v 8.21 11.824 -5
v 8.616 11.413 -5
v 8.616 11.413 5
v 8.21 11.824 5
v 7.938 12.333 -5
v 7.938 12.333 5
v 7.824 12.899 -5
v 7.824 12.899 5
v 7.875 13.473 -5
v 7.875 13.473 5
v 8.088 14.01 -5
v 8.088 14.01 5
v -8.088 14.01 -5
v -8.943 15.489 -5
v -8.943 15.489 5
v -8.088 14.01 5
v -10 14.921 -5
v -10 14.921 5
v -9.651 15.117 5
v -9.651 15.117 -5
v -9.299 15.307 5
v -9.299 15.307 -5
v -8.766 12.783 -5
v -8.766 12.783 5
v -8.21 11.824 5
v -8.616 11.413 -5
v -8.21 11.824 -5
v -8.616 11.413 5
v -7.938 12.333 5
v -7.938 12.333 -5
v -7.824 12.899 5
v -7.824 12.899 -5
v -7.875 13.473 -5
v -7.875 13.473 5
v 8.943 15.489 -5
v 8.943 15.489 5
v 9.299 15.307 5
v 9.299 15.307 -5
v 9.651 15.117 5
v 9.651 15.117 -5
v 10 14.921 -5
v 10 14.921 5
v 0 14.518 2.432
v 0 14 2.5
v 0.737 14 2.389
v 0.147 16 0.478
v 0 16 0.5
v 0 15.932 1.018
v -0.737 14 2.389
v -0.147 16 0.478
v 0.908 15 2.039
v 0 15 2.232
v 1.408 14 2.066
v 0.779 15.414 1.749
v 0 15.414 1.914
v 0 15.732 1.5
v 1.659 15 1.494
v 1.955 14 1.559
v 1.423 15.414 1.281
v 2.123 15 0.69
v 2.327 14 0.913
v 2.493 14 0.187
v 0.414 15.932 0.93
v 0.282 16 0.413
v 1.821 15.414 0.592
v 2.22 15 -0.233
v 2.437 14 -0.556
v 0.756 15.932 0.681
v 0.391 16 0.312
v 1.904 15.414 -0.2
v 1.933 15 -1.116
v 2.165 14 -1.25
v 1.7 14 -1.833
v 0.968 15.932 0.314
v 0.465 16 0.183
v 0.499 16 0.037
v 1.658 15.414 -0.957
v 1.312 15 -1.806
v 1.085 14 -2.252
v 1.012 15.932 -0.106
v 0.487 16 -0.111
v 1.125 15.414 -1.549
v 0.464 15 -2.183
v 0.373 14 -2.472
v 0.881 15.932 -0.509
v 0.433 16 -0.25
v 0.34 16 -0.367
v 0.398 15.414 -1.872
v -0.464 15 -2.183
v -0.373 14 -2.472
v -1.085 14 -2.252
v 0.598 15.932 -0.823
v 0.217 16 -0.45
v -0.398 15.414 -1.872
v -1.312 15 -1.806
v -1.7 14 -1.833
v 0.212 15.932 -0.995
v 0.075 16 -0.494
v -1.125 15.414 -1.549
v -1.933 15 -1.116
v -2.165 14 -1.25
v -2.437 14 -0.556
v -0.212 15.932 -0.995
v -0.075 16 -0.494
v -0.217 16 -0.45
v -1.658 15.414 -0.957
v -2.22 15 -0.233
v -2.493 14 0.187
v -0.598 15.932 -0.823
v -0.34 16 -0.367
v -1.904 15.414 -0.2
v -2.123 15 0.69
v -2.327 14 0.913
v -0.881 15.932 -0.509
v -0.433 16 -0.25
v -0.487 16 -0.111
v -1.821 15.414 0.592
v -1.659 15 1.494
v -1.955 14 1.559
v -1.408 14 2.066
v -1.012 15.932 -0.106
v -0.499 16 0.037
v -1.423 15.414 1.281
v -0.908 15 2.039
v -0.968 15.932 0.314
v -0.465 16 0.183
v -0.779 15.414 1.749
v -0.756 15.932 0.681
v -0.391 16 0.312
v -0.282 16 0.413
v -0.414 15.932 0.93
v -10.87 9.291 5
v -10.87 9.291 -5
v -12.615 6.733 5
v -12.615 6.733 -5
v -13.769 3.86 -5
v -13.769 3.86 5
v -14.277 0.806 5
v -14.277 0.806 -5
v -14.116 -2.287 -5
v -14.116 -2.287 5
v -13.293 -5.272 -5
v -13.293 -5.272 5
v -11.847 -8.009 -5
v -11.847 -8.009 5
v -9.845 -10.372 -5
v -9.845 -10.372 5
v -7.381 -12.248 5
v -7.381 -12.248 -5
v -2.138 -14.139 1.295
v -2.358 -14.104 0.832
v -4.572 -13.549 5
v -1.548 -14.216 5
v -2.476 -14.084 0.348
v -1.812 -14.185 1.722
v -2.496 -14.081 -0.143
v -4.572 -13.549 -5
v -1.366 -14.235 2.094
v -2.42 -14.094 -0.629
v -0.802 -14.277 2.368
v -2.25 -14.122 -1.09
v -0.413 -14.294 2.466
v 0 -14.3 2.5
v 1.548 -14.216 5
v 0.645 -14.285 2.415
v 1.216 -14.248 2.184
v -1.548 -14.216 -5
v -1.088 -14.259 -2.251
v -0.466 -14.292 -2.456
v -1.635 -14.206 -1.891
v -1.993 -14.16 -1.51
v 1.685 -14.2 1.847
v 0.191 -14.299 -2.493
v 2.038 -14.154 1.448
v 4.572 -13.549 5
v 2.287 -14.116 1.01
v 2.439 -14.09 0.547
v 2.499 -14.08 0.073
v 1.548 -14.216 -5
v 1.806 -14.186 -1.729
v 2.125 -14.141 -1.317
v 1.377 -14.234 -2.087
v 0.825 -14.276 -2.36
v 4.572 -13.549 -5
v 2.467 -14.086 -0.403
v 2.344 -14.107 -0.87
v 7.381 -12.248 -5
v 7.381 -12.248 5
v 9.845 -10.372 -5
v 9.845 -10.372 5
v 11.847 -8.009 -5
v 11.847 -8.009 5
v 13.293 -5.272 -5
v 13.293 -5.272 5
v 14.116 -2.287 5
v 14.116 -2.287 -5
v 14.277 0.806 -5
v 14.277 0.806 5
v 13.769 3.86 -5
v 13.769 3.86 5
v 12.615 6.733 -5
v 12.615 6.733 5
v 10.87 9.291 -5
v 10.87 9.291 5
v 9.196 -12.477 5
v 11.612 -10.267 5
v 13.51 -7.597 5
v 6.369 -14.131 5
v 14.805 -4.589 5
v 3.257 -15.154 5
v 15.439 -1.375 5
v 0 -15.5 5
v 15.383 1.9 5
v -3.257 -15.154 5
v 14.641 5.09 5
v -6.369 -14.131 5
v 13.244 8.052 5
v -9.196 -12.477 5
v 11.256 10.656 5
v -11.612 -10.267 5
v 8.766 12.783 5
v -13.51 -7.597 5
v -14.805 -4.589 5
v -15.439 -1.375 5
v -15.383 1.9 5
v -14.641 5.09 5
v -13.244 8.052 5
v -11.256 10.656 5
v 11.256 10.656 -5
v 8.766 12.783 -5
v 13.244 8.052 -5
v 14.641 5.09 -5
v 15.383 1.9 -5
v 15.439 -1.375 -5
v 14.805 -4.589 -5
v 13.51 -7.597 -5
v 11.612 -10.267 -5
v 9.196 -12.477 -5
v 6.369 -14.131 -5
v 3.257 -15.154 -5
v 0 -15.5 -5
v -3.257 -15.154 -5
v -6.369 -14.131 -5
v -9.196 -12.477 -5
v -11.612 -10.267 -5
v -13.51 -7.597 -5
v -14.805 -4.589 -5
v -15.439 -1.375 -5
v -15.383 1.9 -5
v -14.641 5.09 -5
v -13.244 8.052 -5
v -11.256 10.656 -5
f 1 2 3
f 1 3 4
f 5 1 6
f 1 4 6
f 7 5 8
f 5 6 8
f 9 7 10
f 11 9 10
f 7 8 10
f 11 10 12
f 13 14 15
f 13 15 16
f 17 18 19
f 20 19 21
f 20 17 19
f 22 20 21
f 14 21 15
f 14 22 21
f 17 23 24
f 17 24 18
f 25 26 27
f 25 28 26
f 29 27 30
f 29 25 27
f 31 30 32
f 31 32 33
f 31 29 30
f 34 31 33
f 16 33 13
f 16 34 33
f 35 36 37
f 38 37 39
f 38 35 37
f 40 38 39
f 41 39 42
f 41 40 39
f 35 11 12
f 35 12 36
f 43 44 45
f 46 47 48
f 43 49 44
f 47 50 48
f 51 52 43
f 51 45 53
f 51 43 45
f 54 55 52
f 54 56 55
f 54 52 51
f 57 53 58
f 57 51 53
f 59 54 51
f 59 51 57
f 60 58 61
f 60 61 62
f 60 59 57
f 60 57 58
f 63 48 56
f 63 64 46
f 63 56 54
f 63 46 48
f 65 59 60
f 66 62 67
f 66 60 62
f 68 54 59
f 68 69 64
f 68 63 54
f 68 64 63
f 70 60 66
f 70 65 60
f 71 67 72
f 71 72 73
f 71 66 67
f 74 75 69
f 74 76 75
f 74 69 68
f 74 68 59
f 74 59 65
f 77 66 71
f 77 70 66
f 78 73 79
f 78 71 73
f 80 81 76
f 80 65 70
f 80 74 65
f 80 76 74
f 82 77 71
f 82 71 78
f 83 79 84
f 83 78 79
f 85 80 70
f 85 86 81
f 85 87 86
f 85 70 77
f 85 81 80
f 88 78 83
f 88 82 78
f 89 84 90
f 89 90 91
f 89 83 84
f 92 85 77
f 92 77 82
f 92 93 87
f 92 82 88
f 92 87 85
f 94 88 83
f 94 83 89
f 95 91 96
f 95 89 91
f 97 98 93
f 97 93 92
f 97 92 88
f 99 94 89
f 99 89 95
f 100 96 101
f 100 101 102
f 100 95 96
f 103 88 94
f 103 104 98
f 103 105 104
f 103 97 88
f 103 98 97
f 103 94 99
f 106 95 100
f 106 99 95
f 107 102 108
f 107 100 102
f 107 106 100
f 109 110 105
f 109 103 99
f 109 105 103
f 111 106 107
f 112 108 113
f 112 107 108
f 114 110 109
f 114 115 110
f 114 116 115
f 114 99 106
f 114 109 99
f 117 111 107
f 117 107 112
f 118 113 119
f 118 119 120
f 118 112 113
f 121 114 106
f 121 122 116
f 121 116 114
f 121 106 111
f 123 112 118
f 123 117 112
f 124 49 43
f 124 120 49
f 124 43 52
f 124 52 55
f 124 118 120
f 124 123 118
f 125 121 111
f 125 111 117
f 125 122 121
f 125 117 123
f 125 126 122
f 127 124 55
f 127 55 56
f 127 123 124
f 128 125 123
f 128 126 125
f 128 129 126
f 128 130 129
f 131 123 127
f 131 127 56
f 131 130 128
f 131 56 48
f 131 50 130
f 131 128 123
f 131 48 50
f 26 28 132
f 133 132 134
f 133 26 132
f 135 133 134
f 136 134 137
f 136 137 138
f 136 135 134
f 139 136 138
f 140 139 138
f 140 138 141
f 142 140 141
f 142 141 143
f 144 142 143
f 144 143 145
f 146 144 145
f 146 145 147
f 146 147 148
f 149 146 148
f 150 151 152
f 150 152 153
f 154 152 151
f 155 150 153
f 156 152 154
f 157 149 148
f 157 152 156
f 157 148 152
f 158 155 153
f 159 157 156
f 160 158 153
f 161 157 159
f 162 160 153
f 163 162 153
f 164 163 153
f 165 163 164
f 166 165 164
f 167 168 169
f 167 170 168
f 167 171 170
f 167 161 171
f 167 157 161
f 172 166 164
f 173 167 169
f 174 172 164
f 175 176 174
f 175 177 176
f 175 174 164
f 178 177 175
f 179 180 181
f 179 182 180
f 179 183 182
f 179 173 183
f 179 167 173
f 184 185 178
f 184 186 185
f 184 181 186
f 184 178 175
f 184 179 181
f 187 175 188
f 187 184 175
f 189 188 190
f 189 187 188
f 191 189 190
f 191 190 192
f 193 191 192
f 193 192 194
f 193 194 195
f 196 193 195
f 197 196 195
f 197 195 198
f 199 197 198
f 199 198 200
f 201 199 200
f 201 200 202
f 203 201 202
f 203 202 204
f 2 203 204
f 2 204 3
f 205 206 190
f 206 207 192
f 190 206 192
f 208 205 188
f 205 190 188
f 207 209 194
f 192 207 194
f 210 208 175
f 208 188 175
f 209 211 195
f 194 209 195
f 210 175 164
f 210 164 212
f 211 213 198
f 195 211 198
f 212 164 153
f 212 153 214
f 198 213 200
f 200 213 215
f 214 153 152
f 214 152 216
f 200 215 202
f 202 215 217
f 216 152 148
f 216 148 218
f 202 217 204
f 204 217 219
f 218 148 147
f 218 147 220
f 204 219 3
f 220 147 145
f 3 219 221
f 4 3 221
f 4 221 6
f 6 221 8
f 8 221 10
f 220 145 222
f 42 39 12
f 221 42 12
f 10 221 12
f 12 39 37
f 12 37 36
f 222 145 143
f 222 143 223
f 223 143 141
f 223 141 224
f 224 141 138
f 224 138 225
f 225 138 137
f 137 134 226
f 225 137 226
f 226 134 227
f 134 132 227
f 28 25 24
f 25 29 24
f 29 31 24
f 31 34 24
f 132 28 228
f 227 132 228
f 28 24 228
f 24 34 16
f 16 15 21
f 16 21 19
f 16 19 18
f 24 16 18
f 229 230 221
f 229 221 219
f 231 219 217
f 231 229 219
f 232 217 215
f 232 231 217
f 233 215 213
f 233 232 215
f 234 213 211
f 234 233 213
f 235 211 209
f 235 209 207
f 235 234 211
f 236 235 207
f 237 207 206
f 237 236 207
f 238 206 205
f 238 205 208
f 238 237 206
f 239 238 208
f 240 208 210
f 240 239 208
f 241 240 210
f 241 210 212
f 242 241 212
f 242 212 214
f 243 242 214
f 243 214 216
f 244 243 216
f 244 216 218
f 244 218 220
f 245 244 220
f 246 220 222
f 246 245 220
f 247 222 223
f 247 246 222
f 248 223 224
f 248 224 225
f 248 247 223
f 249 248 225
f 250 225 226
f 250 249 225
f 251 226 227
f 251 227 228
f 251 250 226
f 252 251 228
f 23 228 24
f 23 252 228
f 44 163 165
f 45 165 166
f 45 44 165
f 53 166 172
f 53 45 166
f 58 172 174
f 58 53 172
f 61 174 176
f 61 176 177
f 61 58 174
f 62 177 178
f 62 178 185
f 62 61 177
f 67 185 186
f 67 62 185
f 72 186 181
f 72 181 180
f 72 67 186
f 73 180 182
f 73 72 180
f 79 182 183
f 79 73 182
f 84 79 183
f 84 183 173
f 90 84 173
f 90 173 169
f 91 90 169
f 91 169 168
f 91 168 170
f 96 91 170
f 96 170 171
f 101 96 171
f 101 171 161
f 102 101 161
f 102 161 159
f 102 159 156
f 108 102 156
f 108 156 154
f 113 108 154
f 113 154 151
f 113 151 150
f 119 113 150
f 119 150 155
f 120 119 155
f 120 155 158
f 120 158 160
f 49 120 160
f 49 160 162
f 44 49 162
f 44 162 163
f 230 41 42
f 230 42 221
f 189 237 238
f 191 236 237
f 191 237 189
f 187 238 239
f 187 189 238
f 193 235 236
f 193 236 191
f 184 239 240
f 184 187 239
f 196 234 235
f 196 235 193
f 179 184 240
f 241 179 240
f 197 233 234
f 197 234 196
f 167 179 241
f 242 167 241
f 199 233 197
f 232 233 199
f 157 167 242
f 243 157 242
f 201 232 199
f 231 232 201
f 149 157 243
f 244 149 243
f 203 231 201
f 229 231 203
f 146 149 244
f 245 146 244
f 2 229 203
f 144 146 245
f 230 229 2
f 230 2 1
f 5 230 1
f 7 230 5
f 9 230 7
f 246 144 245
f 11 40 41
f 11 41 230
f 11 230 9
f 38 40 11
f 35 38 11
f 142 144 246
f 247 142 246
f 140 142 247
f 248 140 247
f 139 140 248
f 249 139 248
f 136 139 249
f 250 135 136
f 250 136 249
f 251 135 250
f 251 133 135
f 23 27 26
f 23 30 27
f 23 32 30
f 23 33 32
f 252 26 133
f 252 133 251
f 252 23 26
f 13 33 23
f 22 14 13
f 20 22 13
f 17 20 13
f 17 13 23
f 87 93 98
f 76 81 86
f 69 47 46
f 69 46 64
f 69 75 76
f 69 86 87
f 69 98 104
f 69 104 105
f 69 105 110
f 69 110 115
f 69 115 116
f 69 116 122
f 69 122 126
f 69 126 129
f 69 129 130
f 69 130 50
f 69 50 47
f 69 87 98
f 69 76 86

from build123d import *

# Parameters (mm, degrees)
BOSS_EXTRUDE1_DEPTH             = 5
BOSS_EXTRUDE1_DEPTH_BACK        = 5
SKETCH2_R                       = 2.5
BOSS_EXTRUDE2_DEPTH             = 16
BOSS_EXTRUDE2_DIRECTION_2_REACH = 24.483
FILLET2_R                       = 2
FILLET3_R                       = 2


with BuildPart() as part:
    # Sketch1 → Boss-Extrude1 (new, two sides: drawn at the far end of the back side and taken through both)
    with BuildSketch(Plane.XY.offset(-BOSS_EXTRUDE1_DEPTH_BACK)):
        with BuildLine():
            Line((7.15, 12.384163274), (8.942753286, 15.489303051))
            ThreePointArc((8.942753286, 15.489303051), (9.47564549, 15.212840275), (10, 14.920508076))
            Line((10, 14.920508076), (8.765969771, 12.783105021))
            ThreePointArc((8.765969771, 12.783105021), (0, -15.5), (-8.765969771, 12.783105021))
            Line((-8.765969771, 12.783105021), (-10, 14.920508076))
            ThreePointArc((-10, 14.920508076), (-9.47564549, 15.212840275), (-8.942753286, 15.489303051))
            Line((-8.942753286, 15.489303051), (-7.15, 12.384163274))
            ThreePointArc((-7.15, 12.384163274), (0, -14.3), (7.15, 12.384163274))
        make_face()
    extrude(amount=BOSS_EXTRUDE1_DEPTH + BOSS_EXTRUDE1_DEPTH_BACK)

    # Sketch2 → Boss-Extrude2 (add)
    with BuildSketch(Plane(origin=(0, 0, 0), x_dir=(1, 0, 0), z_dir=(0, 1, 0))):
        Circle(SKETCH2_R)
    extrude(amount=BOSS_EXTRUDE2_DEPTH)

    # Sketch2 → Boss-Extrude2 direction 2 (add, up to next)
    with BuildSketch(Plane(origin=(0, 0, 0), x_dir=(1, 0, 0), z_dir=(0, 1, 0)), mode=Mode.PRIVATE) as boss_extrude2_direction_2_sk1:
        Circle(SKETCH2_R)
    boss_extrude2_direction_2_tool1 = extrude(boss_extrude2_direction_2_sk1.sketch, amount=-BOSS_EXTRUDE2_DIRECTION_2_REACH, mode=Mode.PRIVATE) - part.part
    add(boss_extrude2_direction_2_tool1.solids().sort_by_distance((0, 0, 0))[0])

    # Fillet2
    fillet2_edges = [part.edges().sort_by_distance(p)[0] for p in [
        (-2.5, 16, 0),
    ]]
    fillet(fillet2_edges, radius=FILLET2_R)

    # Fillet3
    fillet3_edges = [part.edges().sort_by_distance(p)[0] for p in [
        (7.15, 12.384163274, 0),
        (-7.15, 12.384163274, 0),
    ]]
    fillet(fillet3_edges, radius=FILLET3_R)


solid = part.part
